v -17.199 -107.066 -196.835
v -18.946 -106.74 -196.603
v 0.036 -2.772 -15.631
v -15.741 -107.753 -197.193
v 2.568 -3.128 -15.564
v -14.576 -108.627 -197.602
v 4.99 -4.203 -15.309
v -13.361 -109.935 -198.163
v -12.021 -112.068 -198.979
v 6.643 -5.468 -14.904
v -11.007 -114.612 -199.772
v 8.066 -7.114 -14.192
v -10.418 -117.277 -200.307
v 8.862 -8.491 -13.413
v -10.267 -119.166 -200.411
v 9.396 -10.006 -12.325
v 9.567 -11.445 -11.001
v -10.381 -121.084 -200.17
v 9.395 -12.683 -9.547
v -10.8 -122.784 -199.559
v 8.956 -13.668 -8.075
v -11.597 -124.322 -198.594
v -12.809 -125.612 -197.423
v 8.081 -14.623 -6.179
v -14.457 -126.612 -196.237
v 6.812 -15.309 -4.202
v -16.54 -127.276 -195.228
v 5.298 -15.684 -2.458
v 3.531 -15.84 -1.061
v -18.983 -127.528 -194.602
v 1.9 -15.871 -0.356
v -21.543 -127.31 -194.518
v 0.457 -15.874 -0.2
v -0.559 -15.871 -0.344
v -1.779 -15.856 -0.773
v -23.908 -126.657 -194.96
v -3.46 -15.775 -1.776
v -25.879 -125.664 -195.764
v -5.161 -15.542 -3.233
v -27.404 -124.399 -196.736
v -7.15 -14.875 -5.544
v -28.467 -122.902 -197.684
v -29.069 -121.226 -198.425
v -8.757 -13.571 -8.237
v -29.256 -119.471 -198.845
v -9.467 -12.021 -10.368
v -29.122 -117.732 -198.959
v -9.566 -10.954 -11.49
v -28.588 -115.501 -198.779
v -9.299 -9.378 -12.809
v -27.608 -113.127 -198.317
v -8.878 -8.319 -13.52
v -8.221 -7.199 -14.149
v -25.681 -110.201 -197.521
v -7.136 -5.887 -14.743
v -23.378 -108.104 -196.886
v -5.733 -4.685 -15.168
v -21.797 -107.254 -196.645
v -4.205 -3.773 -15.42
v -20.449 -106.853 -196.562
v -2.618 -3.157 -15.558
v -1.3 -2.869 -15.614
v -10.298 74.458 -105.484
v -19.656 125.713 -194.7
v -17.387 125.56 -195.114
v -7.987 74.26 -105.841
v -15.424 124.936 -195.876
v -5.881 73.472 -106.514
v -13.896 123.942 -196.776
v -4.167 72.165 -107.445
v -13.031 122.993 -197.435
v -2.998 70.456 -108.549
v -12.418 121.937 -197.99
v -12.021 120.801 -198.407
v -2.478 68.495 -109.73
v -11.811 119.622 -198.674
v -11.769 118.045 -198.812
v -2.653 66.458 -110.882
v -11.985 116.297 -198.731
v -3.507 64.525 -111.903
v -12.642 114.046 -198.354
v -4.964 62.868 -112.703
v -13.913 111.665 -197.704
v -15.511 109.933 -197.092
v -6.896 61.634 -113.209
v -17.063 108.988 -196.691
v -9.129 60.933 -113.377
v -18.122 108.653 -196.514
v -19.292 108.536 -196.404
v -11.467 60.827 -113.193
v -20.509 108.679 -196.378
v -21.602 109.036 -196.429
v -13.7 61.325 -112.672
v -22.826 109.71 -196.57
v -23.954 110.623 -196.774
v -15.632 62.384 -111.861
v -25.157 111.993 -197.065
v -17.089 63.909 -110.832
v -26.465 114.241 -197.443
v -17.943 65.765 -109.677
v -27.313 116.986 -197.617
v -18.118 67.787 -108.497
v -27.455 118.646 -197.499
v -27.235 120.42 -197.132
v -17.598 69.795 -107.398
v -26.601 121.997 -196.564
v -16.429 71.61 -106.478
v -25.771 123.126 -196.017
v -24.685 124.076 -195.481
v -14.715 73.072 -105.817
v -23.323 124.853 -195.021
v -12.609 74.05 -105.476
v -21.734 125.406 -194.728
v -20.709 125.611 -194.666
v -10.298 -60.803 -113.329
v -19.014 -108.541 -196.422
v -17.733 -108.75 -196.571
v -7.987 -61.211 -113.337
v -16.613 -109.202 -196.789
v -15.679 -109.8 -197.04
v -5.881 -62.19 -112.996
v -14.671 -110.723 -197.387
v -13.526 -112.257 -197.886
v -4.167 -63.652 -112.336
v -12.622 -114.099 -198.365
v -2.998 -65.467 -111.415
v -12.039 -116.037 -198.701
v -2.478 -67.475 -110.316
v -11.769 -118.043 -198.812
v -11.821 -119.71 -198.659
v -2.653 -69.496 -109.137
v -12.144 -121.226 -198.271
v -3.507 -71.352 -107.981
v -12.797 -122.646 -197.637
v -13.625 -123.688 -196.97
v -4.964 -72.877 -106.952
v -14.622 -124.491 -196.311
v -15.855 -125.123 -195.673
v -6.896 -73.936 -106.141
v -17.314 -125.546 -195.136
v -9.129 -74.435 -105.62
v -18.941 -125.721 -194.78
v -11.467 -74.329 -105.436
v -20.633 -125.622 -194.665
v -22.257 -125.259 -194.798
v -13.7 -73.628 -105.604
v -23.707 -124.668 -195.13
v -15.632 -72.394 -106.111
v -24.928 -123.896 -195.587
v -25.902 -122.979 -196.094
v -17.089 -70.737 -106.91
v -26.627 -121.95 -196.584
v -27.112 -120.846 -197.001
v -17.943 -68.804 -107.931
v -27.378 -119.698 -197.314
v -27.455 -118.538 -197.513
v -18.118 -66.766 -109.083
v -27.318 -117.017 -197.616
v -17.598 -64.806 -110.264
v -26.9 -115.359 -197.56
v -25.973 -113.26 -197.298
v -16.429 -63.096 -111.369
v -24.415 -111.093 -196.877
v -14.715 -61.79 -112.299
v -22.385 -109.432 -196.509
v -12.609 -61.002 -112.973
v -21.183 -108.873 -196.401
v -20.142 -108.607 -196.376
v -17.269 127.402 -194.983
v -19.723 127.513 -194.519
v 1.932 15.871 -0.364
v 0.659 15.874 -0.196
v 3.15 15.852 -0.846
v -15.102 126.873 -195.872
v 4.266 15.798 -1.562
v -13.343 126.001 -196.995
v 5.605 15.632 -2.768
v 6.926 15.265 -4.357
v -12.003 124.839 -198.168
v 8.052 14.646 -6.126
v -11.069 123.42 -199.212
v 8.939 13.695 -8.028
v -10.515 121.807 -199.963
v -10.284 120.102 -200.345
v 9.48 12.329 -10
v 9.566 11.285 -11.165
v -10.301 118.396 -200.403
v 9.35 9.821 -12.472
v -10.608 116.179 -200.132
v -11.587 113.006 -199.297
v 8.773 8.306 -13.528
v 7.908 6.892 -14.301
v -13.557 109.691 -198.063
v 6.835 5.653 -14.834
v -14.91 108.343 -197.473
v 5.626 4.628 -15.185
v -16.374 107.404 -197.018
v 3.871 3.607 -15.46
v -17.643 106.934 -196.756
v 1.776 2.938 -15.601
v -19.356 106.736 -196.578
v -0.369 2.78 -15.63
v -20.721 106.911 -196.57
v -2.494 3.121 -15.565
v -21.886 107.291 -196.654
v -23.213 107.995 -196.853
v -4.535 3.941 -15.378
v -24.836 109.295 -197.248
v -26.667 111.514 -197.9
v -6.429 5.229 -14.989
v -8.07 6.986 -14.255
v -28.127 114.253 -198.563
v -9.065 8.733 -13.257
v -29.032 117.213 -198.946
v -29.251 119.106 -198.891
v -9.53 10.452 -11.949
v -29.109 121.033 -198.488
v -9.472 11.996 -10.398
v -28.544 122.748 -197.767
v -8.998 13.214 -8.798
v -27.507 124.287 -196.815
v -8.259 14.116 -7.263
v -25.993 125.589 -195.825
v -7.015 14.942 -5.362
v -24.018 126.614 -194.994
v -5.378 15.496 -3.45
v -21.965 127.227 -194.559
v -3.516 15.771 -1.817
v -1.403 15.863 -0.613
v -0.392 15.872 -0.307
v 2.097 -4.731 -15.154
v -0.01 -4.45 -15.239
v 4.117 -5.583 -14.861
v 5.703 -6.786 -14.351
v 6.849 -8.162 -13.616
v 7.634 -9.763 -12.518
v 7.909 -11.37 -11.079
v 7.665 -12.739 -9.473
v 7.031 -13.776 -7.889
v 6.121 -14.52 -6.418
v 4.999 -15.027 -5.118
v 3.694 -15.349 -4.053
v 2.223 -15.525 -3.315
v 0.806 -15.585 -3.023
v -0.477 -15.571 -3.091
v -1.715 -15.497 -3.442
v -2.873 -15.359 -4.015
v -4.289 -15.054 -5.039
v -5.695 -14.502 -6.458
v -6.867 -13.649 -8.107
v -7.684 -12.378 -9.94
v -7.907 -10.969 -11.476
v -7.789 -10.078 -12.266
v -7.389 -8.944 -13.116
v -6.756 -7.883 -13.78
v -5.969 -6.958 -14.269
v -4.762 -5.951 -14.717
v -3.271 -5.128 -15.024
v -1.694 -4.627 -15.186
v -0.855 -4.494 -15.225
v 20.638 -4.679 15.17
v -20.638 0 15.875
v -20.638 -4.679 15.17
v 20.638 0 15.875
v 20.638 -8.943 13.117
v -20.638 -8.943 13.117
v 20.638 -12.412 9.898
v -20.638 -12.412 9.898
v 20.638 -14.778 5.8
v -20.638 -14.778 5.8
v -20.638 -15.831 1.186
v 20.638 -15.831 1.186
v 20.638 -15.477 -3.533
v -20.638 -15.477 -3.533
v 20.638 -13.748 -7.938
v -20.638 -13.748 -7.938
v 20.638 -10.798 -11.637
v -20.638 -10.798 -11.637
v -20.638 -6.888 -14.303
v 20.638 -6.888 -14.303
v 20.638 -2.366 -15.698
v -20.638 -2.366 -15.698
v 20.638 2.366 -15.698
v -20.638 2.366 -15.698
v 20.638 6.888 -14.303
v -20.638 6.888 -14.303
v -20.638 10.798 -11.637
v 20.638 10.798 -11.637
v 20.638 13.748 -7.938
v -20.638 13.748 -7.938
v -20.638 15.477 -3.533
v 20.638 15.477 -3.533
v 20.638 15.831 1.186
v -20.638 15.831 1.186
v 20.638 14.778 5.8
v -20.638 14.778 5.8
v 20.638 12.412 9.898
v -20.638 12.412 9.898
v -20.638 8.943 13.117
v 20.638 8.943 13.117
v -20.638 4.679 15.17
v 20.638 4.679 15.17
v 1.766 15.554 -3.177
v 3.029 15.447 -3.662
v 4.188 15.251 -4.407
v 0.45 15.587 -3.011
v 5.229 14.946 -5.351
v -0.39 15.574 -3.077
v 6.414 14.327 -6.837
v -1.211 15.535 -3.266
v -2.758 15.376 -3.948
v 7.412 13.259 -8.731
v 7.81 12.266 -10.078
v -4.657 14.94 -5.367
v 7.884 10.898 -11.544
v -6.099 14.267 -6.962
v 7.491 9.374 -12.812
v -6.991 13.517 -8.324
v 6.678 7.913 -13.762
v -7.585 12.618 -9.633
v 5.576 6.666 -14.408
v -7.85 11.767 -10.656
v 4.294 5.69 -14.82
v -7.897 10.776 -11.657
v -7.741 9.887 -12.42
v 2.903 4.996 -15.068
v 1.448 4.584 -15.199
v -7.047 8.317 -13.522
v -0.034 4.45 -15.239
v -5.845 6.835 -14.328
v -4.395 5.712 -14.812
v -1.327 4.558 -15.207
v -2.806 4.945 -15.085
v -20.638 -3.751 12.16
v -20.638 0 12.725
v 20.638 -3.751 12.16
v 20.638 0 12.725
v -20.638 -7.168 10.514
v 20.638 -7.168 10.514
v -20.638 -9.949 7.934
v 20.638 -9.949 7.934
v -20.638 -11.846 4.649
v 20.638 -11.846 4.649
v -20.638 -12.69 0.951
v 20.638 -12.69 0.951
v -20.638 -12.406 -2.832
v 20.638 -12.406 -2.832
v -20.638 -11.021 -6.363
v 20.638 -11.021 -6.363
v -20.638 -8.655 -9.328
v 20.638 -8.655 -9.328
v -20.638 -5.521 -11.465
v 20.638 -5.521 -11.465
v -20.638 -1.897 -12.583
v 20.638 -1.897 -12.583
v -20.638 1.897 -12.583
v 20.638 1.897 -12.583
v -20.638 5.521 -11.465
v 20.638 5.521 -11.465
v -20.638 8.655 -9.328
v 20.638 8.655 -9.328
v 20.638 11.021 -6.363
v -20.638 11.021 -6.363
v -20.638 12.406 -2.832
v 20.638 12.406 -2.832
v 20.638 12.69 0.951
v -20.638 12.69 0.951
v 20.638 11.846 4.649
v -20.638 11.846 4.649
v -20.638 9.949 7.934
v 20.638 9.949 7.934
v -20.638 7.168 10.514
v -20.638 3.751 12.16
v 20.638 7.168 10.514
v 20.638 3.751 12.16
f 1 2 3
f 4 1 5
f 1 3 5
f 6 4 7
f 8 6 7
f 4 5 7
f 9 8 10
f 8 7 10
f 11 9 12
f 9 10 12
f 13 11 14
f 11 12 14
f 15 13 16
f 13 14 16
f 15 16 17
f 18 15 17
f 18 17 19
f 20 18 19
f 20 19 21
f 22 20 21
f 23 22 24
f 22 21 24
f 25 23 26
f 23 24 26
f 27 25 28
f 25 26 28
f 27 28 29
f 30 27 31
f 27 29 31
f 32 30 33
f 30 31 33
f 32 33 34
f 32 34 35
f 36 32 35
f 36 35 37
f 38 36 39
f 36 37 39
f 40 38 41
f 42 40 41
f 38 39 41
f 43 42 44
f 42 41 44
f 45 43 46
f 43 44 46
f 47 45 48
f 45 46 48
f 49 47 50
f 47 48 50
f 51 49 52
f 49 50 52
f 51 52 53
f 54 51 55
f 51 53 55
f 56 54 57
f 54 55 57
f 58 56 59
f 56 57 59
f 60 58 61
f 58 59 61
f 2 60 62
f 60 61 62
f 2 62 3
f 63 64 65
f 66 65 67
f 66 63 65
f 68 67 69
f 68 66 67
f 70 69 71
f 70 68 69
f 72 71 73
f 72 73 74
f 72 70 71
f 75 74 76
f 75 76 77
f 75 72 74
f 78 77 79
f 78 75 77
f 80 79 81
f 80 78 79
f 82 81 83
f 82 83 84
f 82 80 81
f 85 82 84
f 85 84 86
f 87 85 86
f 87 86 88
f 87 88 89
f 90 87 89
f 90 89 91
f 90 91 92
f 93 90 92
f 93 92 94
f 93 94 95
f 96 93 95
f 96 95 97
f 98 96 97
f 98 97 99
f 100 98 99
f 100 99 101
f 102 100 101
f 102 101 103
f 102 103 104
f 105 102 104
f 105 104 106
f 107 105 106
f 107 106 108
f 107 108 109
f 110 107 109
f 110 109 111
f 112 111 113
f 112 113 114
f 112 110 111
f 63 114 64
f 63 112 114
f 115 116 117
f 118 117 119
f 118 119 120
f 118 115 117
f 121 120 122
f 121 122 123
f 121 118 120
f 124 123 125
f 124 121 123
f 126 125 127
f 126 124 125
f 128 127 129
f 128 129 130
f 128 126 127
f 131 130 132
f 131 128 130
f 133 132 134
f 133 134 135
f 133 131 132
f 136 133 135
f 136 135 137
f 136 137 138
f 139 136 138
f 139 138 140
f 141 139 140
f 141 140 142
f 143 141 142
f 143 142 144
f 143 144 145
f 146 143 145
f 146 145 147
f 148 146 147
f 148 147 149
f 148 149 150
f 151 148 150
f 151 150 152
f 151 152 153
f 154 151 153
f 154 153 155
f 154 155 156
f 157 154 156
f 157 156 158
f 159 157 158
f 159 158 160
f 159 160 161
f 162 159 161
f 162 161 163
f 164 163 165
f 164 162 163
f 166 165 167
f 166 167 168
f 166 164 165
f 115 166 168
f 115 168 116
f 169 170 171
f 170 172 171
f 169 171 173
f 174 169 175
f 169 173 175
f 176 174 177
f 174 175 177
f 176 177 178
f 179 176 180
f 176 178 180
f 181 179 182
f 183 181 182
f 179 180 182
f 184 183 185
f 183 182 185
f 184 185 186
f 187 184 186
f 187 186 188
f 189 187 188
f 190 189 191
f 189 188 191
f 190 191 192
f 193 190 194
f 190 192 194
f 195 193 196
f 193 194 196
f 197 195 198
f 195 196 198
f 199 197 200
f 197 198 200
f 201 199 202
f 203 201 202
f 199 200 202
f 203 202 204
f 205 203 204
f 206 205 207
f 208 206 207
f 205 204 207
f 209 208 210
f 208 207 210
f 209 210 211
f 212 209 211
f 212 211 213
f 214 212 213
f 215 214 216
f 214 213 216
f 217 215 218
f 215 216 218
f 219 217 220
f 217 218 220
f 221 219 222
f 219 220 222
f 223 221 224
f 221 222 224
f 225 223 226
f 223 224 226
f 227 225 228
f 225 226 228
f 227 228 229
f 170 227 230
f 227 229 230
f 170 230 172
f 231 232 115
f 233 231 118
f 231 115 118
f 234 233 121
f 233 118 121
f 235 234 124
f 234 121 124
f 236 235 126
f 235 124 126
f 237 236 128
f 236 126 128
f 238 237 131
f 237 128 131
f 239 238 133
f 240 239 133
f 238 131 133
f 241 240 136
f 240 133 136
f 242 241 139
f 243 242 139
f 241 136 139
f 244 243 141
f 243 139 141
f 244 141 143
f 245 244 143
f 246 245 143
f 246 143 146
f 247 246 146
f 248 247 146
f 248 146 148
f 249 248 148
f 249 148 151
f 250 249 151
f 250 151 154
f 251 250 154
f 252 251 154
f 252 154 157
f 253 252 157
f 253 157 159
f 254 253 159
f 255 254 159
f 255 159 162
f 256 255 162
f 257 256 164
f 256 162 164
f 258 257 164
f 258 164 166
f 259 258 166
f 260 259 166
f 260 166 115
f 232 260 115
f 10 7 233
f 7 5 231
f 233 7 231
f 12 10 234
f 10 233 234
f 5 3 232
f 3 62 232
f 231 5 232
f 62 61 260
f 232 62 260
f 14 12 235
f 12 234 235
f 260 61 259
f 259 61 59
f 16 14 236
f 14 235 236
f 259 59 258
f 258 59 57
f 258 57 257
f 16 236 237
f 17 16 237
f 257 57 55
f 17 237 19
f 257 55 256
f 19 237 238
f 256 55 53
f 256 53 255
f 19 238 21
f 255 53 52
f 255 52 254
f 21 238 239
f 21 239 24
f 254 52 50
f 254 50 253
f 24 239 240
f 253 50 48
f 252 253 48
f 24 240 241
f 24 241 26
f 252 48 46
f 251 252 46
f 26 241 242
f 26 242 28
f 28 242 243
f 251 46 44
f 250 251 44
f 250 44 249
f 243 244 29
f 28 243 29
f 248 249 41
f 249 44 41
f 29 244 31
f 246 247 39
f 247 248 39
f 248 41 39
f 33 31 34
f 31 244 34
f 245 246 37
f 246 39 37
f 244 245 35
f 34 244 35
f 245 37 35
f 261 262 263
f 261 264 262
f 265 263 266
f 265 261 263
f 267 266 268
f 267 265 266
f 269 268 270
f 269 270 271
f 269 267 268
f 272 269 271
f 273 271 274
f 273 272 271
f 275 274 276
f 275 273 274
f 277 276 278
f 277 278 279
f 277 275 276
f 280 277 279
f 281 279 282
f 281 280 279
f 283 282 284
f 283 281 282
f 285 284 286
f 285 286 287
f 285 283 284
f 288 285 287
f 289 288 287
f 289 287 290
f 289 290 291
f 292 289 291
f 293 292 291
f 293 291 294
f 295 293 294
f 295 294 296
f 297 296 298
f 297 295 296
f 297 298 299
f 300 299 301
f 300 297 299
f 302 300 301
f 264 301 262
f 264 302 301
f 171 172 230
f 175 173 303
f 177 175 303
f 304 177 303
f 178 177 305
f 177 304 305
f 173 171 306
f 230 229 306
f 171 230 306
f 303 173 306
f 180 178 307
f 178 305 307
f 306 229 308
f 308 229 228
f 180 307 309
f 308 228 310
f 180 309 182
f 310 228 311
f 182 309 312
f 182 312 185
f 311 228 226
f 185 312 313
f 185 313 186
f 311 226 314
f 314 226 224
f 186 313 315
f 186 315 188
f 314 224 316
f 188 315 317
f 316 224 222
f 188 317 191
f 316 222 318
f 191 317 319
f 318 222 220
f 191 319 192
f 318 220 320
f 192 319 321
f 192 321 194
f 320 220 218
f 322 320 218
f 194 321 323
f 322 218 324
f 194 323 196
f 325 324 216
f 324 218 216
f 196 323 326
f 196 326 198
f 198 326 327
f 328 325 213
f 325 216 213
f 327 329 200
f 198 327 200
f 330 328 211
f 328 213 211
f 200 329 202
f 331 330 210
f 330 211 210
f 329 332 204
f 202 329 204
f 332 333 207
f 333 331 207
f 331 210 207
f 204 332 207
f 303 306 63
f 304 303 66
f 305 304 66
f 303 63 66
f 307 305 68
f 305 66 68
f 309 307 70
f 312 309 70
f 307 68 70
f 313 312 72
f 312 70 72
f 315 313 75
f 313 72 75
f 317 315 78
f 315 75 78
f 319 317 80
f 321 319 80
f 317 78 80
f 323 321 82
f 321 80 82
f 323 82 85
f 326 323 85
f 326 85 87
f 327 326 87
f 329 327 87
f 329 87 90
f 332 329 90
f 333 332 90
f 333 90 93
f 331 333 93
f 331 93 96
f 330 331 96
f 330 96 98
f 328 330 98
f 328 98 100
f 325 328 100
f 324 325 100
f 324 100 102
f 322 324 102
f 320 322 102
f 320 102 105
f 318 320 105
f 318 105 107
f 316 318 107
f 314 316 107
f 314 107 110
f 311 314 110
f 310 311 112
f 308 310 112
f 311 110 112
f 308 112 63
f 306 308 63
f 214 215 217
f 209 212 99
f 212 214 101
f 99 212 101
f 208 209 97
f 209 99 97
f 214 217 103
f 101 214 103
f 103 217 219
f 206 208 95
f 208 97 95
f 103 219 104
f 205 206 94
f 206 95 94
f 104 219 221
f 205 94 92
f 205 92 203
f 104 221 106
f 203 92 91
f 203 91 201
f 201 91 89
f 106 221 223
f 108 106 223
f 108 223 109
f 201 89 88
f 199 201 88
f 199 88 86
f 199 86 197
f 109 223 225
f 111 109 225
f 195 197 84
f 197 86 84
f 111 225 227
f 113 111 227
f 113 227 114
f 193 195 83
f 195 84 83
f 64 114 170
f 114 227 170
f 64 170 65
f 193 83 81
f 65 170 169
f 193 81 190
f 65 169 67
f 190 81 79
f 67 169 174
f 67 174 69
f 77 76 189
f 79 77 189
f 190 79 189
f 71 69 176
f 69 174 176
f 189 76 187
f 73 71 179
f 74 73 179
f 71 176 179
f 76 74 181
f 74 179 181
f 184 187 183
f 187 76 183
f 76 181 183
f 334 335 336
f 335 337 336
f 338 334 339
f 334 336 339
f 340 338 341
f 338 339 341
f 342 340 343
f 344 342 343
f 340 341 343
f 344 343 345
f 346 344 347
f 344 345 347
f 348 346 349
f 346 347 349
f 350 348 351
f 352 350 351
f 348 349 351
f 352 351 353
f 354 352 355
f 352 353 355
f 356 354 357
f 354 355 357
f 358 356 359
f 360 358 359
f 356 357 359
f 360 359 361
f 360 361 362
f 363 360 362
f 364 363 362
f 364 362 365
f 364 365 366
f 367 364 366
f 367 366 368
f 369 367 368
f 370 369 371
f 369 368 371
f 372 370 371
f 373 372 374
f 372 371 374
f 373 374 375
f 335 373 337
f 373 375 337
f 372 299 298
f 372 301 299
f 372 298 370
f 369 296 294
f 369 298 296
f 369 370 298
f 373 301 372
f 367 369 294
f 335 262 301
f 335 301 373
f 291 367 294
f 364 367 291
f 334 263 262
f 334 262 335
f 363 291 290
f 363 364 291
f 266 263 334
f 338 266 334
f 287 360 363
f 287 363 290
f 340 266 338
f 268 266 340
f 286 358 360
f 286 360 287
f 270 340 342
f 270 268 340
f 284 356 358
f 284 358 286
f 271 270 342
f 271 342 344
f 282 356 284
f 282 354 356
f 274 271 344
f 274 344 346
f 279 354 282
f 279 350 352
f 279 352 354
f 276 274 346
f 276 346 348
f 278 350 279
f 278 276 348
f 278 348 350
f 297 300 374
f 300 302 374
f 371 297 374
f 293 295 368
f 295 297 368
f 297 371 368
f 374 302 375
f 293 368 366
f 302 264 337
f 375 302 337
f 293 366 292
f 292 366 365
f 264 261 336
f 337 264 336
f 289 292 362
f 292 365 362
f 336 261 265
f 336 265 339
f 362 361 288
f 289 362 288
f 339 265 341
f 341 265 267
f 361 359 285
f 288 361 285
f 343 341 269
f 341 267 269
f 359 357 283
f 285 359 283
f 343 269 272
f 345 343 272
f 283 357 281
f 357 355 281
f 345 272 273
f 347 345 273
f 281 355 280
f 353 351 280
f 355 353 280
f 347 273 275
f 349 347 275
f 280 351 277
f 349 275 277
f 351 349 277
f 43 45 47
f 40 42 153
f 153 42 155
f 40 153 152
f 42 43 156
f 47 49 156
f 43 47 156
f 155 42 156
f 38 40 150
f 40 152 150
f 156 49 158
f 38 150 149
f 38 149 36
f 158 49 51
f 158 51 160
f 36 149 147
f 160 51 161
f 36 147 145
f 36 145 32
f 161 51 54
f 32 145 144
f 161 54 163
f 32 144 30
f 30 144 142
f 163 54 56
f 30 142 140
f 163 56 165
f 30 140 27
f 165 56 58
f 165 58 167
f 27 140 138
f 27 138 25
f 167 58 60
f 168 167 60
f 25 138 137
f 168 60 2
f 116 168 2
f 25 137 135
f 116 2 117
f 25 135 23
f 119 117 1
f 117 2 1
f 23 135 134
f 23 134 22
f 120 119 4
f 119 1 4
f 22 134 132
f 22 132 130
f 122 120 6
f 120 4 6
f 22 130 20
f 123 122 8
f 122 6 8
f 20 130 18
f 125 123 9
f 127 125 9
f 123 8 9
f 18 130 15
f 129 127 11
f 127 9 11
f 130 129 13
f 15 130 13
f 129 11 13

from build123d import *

# Parameters (mm, degrees)
SKETCH6_W                       = 41.275
SKETCH6_H                       = 3.1496
BOSS_EXTRUDE3_REACH             = 155.707
BOSS_EXTRUDE3_END_RADIUS        = 15.875
SKETCH7_R                       = 9.525
SKETCH7_R_2                     = 7.874
BOSS_EXTRUDE3_DIRECTION_2_DEPTH = 113.697907
BOSS_EXTRUDE4_REACH             = 239.965
BOSS_EXTRUDE4_END_RADIUS        = 15.875
SKETCH8_R                       = 9.525
SKETCH8_R_2                     = 7.874
BOSS_EXTRUDE4_DIRECTION_2_DEPTH = 113.697907
SKETCH5_R                       = 12.7


with BuildPart() as part:
    # Sketch6 → Revolve2 (revolve)
    with BuildSketch(Plane(origin=(0, 0, 0), x_dir=(1, 0, 0), z_dir=(0, 1, 0)), mode=Mode.PRIVATE) as revolve2_sk:
        with Locations((0, 14.3002)):
            Rectangle(SKETCH6_W, SKETCH6_H)
    revolve(revolve2_sk.sketch.rotate(Axis((-66.78681796, 0, 0), (1, 0, 0)), 180), axis=Axis((-66.78681796, 0, 0), (1, 0, 0)))


with BuildPart() as body_2:
    # Boss-Extrude3: up to this cylinder (the profile starts outside it)
    boss_extrude3_end = Plane(origin=(-10.298065, 0, 0), z_dir=(-1, 0, 0)) * Cylinder(BOSS_EXTRUDE3_END_RADIUS, 344.164, mode=Mode.PRIVATE)
    # Sketch7 → Boss-Extrude3 (new, up to the surface)
    with BuildSketch(Plane(origin=(-10.298064703, -67.630870949, -109.406671296), x_dir=(-0.5677718732695322, 0.7380955319549846, -0.36448605684181484), z_dir=(-0.09057391637954032, -0.496100169184832, -0.8635282206196003)), mode=Mode.PRIVATE) as boss_extrude3_sk1:
        with Locations(Location((0, 0, 0), (0, 0, 34.75825921))):
            Circle(SKETCH7_R)
        with Locations(Location((0, 0, 0), (0, 0, 34.75825921))):
            Circle(SKETCH7_R_2, mode=Mode.SUBTRACT)
    boss_extrude3_tool1 = extrude(boss_extrude3_sk1.sketch, amount=-BOSS_EXTRUDE3_REACH, mode=Mode.PRIVATE) - boss_extrude3_end
    add(boss_extrude3_tool1.solids().sort_by_distance((-10.298065, -75.656323, -104.796019))[0])

    # Sketch7 → Boss-Extrude3 direction 2 (add)
    with BuildSketch(Plane(origin=(-10.298064703, -67.630870949, -109.406671296), x_dir=(-0.5677718732695322, 0.7380955319549846, -0.36448605684181484), z_dir=(-0.09057391637954032, -0.496100169184832, -0.8635282206196003))):
        with Locations(Location((0, 0, 0), (0, 0, 34.75825921))):
            Circle(SKETCH7_R)
        with Locations(Location((0, 0, 0), (0, 0, 34.75825921))):
            Circle(SKETCH7_R_2, mode=Mode.SUBTRACT)
    extrude(amount=BOSS_EXTRUDE3_DIRECTION_2_DEPTH)


with BuildPart() as body_3:
    # Boss-Extrude4: up to this cylinder (the profile starts outside it)
    boss_extrude4_end = Plane(origin=(-10.298065, 0, 0), z_dir=(-1, 0, 0)) * Cylinder(BOSS_EXTRUDE4_END_RADIUS, 512.68, mode=Mode.PRIVATE)
    # Sketch8 → Boss-Extrude4 (new, up to the surface)
    with BuildSketch(Plane(origin=(-10.298064703, 67.630870949, -109.406671296), x_dir=(-0.9336956723978411, -0.343921706944635, -0.09965064394088002), z_dir=(-0.09057391637954033, 0.4961001691848235, -0.8635282206196053)), mode=Mode.PRIVATE) as boss_extrude4_sk1:
        with Locations(Location((0, 0, 0), (0, 0, 110.356024642))):
            Circle(SKETCH8_R)
        with Locations(Location((0, 0, 0), (0, 0, 110.356024642))):
            Circle(SKETCH8_R_2, mode=Mode.SUBTRACT)
    boss_extrude4_tool1 = extrude(boss_extrude4_sk1.sketch, amount=-BOSS_EXTRUDE4_REACH, mode=Mode.PRIVATE) - boss_extrude4_end
    add(boss_extrude4_tool1.solids().sort_by_distance((-10.298065, 59.605419, -114.017323))[0])

    # Sketch8 → Boss-Extrude4 direction 2 (add)
    with BuildSketch(Plane(origin=(-10.298064703, 67.630870949, -109.406671296), x_dir=(-0.9336956723978411, -0.343921706944635, -0.09965064394088002), z_dir=(-0.09057391637954033, 0.4961001691848235, -0.8635282206196053))):
        with Locations(Location((0, 0, 0), (0, 0, 110.356024642))):
            Circle(SKETCH8_R)
        with Locations(Location((0, 0, 0), (0, 0, 110.356024642))):
            Circle(SKETCH8_R_2, mode=Mode.SUBTRACT)
    extrude(amount=BOSS_EXTRUDE4_DIRECTION_2_DEPTH)


with BuildPart() as cut_sweep1_tool:
    # Cut-Sweep1: sweep along a path in Sketch4
    with BuildLine(Plane(origin=(-89.807251208, 0, -36.284484758), x_dir=(0.3746065934159061, 0, -0.92718385456679), z_dir=(0.92718385456679, 1.7211018129619384e-15, 0.3746065934159061))) as cut_sweep1_path:
        Line((182.017895706, -149.288318914), (197.170540677, -9.5862243))
        ThreePointArc((197.170540677, -9.5862243), (197.688900594, 0), (197.170540677, 9.5862243))
        Line((197.170540677, 9.5862243), (182.017895706, 149.288318914))
    # Sketch5 → Cut-Sweep1 (sweep)
    with BuildSketch(Plane(origin=(0, 0, 0), x_dir=(1, 0, 0), z_dir=(0, 1, 0))):
        with Locations((-15.7516856, 219.578441616)):
            Circle(SKETCH5_R)
    sweep(path=cut_sweep1_path.line)


with BuildPart() as body_2_1:
    add(body_2.part)

    # Cut-Sweep1: cut by cut_sweep1_tool
    add(cut_sweep1_tool.part, mode=Mode.SUBTRACT)


with BuildPart() as body_3_1:
    add(body_3.part)

    # Cut-Sweep1: cut by cut_sweep1_tool
    add(cut_sweep1_tool.part, mode=Mode.SUBTRACT)


solid = Compound([part.part, body_2_1.part, body_3_1.part])
